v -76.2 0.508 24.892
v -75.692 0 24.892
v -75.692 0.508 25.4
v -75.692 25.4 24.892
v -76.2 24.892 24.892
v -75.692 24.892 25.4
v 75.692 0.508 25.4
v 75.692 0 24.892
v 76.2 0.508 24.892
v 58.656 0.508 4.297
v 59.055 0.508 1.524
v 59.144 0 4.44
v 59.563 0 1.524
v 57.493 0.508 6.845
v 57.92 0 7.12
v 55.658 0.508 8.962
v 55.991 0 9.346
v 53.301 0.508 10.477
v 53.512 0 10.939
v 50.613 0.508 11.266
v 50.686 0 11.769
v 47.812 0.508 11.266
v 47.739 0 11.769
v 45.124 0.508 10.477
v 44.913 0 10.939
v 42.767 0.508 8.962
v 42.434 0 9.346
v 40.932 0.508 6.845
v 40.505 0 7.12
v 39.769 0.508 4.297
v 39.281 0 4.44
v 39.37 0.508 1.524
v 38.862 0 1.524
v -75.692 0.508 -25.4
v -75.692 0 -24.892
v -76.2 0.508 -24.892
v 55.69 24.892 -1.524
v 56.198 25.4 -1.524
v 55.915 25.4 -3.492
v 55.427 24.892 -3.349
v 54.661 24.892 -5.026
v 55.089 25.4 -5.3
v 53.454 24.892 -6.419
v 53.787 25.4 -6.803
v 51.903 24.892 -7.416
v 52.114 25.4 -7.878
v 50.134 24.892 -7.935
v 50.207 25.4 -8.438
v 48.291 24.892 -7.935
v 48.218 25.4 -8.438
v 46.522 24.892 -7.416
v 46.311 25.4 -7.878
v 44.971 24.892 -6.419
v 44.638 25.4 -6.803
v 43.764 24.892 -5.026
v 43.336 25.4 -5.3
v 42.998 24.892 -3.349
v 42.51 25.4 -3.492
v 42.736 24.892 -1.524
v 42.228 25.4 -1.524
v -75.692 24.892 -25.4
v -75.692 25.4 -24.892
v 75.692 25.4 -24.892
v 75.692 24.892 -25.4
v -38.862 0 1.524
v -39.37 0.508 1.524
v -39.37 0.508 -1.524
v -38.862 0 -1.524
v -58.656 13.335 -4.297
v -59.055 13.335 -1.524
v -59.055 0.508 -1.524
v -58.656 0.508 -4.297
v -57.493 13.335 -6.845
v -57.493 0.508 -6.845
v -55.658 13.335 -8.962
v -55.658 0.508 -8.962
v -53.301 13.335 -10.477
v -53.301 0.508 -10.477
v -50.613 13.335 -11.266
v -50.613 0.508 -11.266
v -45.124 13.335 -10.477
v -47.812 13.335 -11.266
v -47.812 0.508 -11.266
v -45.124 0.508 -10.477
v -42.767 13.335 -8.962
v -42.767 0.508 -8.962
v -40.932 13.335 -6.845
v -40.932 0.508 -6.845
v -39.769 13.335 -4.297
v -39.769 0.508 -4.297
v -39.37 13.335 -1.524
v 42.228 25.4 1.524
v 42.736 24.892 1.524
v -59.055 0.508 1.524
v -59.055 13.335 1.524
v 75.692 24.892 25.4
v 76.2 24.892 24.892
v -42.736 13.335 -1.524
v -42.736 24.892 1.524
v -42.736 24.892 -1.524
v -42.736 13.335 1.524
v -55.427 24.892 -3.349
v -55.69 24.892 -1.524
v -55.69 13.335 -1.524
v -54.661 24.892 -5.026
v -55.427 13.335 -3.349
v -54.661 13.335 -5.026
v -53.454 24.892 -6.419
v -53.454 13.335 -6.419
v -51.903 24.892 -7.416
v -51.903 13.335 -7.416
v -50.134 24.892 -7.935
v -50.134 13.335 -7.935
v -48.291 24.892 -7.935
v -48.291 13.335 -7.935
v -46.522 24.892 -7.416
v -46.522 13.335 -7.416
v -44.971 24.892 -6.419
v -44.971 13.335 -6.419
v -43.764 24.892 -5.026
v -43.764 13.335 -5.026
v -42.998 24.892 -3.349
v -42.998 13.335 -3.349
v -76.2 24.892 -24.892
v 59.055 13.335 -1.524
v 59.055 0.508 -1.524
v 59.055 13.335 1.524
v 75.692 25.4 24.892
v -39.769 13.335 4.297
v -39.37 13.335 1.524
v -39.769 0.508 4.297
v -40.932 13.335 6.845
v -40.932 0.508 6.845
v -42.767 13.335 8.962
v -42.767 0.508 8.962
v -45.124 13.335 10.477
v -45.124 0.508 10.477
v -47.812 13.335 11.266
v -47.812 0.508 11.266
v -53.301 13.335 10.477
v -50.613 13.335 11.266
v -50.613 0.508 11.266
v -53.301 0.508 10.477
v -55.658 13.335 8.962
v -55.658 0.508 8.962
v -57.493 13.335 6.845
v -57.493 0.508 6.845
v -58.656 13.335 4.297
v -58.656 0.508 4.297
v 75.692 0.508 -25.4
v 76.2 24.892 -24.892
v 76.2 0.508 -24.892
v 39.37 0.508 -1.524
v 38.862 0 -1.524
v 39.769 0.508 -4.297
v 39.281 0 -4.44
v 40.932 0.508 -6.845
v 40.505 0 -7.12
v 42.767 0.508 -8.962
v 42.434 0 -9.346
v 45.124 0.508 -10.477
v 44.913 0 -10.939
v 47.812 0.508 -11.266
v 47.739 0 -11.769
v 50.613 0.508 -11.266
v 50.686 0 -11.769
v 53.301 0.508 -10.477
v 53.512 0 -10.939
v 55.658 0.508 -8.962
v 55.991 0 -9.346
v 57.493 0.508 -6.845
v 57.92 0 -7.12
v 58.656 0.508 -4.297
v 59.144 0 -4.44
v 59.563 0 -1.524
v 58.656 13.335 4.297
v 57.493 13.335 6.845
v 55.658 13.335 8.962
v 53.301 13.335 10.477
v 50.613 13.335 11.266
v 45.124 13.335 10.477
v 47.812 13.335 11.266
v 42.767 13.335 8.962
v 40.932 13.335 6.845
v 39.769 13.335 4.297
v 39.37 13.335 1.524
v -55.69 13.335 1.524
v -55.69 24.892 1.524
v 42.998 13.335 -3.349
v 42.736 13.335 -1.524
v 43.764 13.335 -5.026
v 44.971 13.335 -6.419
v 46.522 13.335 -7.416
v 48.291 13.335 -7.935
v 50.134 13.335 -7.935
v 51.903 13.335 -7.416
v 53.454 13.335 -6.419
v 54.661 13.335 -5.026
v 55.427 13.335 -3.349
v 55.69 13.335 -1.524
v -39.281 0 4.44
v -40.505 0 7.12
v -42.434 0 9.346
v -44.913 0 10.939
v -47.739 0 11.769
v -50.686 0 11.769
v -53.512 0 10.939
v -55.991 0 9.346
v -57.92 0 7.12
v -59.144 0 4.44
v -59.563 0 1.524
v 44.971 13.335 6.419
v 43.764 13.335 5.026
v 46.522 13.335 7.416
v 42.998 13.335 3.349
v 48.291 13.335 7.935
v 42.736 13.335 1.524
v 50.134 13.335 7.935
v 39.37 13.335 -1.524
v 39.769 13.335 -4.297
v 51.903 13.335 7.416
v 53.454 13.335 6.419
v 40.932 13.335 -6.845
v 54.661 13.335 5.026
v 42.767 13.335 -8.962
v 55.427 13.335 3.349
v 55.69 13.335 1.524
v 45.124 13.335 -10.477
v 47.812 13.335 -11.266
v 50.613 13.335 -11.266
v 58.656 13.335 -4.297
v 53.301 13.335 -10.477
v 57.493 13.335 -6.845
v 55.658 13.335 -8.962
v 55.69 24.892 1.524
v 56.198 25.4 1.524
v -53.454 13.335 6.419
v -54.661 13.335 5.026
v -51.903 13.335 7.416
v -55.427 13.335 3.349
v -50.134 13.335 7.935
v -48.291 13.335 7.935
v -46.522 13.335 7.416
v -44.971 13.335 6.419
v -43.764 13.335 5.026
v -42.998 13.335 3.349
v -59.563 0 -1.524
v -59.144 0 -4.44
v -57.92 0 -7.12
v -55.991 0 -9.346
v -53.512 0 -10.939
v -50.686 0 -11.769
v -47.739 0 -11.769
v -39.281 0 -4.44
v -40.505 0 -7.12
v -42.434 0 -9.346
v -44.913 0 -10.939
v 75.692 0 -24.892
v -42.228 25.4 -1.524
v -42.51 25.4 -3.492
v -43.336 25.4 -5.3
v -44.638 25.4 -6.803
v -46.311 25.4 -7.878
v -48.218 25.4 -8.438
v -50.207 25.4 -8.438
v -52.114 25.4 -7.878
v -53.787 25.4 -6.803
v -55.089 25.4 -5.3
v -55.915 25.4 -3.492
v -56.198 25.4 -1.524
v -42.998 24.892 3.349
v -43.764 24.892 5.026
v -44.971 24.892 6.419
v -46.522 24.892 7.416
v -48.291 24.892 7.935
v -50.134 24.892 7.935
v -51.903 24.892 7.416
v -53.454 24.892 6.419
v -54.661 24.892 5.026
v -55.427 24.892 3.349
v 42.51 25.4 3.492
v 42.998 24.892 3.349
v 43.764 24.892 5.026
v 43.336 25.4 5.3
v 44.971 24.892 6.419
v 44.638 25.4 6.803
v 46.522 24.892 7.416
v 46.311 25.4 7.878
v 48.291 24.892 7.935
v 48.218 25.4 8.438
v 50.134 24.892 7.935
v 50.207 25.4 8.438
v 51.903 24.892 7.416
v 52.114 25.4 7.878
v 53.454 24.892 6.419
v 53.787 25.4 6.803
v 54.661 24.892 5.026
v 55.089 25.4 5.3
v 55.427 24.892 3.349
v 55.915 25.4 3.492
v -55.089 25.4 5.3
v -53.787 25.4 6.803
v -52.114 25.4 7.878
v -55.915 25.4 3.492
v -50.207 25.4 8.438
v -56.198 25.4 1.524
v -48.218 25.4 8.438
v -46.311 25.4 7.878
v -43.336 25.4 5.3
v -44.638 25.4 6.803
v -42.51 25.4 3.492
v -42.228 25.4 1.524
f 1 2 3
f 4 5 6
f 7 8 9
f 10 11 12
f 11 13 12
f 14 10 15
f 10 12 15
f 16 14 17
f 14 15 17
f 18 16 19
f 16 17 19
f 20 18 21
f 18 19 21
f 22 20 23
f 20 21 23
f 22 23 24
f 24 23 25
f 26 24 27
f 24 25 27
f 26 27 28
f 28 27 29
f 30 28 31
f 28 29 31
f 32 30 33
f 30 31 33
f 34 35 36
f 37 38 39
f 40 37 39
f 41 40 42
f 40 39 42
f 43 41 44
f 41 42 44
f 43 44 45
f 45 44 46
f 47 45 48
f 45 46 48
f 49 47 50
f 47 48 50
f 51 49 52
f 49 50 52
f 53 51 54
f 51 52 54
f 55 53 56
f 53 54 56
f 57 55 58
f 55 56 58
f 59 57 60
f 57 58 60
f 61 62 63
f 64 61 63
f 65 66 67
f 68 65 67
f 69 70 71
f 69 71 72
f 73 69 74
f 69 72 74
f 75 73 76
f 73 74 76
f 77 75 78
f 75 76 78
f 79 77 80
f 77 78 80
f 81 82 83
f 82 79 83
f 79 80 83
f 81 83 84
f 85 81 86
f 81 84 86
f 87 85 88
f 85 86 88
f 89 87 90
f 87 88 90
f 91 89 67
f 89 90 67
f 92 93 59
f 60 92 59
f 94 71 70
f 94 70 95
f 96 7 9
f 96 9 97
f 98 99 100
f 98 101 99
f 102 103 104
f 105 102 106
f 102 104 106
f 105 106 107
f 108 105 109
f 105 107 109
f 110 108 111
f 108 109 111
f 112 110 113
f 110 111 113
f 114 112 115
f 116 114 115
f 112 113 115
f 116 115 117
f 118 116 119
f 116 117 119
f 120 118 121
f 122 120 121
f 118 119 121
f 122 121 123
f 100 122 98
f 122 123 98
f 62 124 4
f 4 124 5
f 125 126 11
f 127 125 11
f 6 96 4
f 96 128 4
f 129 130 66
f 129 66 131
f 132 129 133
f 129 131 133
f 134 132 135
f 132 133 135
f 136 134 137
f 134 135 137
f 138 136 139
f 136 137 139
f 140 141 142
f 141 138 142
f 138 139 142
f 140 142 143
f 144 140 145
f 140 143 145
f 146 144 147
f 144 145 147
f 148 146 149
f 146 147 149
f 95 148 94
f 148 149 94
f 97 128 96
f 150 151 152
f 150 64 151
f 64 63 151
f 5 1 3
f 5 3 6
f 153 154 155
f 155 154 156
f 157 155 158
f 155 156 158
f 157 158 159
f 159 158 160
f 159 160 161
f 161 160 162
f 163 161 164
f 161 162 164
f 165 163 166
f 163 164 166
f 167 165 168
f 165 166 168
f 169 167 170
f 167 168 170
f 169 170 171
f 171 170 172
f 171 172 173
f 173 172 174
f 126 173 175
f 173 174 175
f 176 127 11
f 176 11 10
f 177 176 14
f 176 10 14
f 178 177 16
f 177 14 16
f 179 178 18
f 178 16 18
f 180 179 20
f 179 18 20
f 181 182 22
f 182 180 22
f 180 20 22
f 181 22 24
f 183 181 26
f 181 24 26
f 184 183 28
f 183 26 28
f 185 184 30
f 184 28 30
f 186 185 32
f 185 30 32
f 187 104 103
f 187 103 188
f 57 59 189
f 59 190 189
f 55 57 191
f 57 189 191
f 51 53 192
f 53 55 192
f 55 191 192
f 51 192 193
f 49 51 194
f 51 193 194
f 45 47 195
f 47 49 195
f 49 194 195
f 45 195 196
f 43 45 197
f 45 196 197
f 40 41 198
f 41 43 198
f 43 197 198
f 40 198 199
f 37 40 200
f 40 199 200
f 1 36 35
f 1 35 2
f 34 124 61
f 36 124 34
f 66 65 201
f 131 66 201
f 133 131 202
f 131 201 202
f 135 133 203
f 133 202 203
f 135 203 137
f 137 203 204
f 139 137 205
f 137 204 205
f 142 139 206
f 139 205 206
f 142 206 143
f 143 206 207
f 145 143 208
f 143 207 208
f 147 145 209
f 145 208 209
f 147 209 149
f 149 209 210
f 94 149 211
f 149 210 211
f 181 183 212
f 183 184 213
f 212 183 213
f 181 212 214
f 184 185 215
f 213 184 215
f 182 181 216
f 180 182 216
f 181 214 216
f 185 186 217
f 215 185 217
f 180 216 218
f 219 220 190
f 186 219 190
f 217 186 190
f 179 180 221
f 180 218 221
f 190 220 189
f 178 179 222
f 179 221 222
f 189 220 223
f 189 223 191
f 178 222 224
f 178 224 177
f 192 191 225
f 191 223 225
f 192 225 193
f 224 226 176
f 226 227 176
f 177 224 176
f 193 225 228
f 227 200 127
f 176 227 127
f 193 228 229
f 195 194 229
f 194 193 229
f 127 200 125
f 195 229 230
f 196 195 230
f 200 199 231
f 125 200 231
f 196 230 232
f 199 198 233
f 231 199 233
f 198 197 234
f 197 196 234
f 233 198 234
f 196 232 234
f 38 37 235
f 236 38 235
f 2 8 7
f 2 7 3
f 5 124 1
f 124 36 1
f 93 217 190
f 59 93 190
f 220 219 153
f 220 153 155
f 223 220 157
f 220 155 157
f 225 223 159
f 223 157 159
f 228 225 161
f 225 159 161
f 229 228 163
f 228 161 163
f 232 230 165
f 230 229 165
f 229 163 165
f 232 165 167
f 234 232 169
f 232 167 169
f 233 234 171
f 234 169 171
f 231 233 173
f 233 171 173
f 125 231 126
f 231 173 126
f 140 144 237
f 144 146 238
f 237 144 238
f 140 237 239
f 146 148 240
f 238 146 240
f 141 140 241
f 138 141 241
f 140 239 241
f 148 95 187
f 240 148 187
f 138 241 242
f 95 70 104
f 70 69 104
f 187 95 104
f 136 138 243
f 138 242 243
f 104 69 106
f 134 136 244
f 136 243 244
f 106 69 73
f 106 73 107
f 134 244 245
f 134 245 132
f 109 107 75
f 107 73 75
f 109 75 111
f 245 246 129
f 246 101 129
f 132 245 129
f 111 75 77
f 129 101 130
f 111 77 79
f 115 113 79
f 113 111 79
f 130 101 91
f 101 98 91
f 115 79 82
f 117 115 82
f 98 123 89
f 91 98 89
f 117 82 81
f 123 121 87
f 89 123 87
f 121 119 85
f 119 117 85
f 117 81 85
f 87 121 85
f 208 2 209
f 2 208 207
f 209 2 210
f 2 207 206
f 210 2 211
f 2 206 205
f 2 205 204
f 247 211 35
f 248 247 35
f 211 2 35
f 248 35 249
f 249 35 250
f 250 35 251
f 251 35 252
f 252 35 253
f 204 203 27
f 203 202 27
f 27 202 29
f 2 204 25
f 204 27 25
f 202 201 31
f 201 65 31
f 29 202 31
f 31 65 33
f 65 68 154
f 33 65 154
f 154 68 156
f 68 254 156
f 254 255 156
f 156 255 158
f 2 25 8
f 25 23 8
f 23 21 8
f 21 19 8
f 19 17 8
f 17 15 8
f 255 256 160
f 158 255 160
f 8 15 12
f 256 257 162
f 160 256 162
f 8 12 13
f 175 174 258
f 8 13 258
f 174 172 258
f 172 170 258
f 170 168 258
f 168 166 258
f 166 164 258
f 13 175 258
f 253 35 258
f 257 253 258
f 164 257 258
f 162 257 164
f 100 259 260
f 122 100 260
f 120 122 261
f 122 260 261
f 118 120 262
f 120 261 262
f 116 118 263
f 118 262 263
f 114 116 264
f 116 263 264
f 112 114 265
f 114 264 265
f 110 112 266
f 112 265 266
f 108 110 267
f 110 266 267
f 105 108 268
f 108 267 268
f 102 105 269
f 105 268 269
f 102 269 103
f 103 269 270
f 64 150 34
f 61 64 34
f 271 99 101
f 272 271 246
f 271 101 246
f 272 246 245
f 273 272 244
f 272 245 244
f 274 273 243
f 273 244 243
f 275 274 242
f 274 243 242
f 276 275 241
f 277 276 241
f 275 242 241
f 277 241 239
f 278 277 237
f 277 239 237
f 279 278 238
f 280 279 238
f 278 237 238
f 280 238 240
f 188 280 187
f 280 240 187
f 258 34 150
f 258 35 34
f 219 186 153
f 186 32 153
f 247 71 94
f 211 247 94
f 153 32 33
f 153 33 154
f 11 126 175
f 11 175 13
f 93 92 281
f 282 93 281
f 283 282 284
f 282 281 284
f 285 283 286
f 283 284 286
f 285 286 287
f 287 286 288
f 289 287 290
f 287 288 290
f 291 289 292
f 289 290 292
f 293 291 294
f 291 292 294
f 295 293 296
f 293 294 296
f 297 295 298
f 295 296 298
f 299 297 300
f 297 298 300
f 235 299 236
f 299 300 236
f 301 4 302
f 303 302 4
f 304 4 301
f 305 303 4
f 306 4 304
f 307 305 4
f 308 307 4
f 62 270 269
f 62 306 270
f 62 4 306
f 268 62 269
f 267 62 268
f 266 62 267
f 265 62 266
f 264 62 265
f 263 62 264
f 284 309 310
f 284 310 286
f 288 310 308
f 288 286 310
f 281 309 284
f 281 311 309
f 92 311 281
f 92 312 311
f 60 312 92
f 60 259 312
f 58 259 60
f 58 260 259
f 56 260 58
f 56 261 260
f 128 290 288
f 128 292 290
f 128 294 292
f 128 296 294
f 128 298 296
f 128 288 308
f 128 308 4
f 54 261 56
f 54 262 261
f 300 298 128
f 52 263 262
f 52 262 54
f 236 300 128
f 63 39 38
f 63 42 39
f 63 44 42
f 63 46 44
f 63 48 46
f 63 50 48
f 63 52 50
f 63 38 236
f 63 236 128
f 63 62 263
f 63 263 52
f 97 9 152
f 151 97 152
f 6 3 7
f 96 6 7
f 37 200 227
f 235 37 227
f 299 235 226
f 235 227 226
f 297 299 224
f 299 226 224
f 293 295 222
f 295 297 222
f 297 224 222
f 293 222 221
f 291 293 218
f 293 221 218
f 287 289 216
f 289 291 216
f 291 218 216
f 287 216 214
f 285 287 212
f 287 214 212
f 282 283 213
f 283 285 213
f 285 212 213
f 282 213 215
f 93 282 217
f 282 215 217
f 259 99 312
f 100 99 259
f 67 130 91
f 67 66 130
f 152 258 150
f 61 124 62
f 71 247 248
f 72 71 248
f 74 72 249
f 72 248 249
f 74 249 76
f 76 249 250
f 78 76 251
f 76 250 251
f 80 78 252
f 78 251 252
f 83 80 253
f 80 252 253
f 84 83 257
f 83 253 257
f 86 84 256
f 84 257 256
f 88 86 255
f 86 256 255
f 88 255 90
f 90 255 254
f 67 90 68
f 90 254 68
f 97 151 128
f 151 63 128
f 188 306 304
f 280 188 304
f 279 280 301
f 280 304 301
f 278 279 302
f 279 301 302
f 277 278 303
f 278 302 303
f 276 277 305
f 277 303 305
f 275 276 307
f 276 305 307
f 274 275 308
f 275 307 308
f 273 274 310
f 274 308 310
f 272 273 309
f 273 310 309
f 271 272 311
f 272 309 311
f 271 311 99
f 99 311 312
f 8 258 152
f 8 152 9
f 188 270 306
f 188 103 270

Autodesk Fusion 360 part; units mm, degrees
sketch "Sketch1" plane through (0, 0, 0) normal (0, 1, 0) x (1, 0, 0)
  line L0 (76.2, 25.4) -> (-76.2, 25.4)
  line L1 (-76.2, 25.4) -> (-76.2, -25.4)
  line L2 (-76.2, -25.4) -> (76.2, -25.4)
  line L3 (76.2, -25.4) -> (76.2, 25.4)
  line L4 (76.2, 25.4) -> (-76.2, -25.4) construction
  line L5 (-76.2, 25.4) -> (76.2, -25.4) construction
  line L6 (-55.6895, 1.524) -> (-55.6895, -1.524)
  arc A0 (-55.6895, -1.524) -> (-42.7355, -1.524) centre (-49.2125, -1.524) ccw
  line L7 (-42.7355, -1.524) -> (-42.7355, 1.524)
  arc A1 (-42.7355, 1.524) -> (-55.6895, 1.524) centre (-49.2125, 1.524) ccw
  line L8 (-49.2125, 1.524) -> (-49.2125, -1.524) construction
  line L9 (0, 0) -> (0, -13.116) construction
  line L10 (-59.055, 1.524) -> (-59.055, -1.524)
  arc A2 (-59.055, -1.524) -> (-39.37, -1.524) centre (-49.2125, -1.524) ccw
  line L11 (-39.37, -1.524) -> (-39.37, 1.524)
  arc A3 (-39.37, 1.524) -> (-59.055, 1.524) centre (-49.2125, 1.524) ccw
  line L12 (-49.2125, 1.524) -> (-49.2125, -1.524) construction
  arc A4 (39.37, -1.524) -> (59.055, -1.524) centre (49.2125, -1.524) ccw
  line L13 (39.37, -1.524) -> (39.37, 1.524)
  arc A5 (59.055, 1.524) -> (39.37, 1.524) centre (49.2125, 1.524) ccw
  line L14 (59.055, 1.524) -> (59.055, -1.524)
  line L15 (55.6895, 1.524) -> (55.6895, -1.524)
  arc A6 (42.7355, -1.524) -> (55.6895, -1.524) centre (49.2125, -1.524) ccw
  line L16 (42.7355, -1.524) -> (42.7355, 1.524)
  arc A7 (55.6895, 1.524) -> (42.7355, 1.524) centre (49.2125, 1.524) ccw
  point P0 (-49.2125, 0)
  point P1 (-49.2125, 0)
  dimension "d1" = 152.4
  dimension "d2" = 50.8
  dimension "d3" = 49.2125
  dimension "d4" = 19.685
  dimension "d5" = 12.954
  dimension "d6" = 23.876
  dimension "d7" = 23.876
extrude "Extrude1" add sketch "Sketch1" along normal blind 25.4 contours L0 L1 L2 L3 | L6 A0 L7 A1 | L10 A2 L11 A3 | A4 L13 A5 L14 | L15 A6 L16 A7
extrude "Extrude2" cut sketch "Sketch1" along normal through all contours L6 A0 L7 A1 | L15 A6 L16 A7
extrude "Extrude3" cut sketch "Sketch1" along normal up to surface (13.335 mm away) contours L10 A2 L11 A3 | A4 L13 A5 L14
chamfer "Chamfer1" distance 0.508 angle 45 28 edges at (0, 0, 25.4) (76.2, 0, 0) (0, 0, -25.4) (-76.2, 0, 0) (-76.2, 12.7, 25.4) (-76.2, 25.4, 0) (-76.2, 12.7, -25.4) (0, 25.4, -25.4) (0, 25.4, 25.4) (76.2, 25.4, 0) (76.2, 12.7, 25.4) (76.2, 12.7, -25.4) (49.2125, 0, -11.3665) (39.37, 0, 0) (49.2125, 0, 11.3665) (59.055, 0, 0) (-39.37, 0, 0) (-49.2125, 0, -11.3665) (-59.055, 0, 0) (-49.2125, 0, 11.3665) (-55.6895, 25.4, 0) (-49.2125, 25.4, -8.001) (-42.7355, 25.4, 0) (-49.2125, 25.4, 8.001) (42.7355, 25.4, 0) (49.2125, 25.4, -8.001) (55.6895, 25.4, 0) (49.2125, 25.4, 8.001)
equation "d7 = d6"
